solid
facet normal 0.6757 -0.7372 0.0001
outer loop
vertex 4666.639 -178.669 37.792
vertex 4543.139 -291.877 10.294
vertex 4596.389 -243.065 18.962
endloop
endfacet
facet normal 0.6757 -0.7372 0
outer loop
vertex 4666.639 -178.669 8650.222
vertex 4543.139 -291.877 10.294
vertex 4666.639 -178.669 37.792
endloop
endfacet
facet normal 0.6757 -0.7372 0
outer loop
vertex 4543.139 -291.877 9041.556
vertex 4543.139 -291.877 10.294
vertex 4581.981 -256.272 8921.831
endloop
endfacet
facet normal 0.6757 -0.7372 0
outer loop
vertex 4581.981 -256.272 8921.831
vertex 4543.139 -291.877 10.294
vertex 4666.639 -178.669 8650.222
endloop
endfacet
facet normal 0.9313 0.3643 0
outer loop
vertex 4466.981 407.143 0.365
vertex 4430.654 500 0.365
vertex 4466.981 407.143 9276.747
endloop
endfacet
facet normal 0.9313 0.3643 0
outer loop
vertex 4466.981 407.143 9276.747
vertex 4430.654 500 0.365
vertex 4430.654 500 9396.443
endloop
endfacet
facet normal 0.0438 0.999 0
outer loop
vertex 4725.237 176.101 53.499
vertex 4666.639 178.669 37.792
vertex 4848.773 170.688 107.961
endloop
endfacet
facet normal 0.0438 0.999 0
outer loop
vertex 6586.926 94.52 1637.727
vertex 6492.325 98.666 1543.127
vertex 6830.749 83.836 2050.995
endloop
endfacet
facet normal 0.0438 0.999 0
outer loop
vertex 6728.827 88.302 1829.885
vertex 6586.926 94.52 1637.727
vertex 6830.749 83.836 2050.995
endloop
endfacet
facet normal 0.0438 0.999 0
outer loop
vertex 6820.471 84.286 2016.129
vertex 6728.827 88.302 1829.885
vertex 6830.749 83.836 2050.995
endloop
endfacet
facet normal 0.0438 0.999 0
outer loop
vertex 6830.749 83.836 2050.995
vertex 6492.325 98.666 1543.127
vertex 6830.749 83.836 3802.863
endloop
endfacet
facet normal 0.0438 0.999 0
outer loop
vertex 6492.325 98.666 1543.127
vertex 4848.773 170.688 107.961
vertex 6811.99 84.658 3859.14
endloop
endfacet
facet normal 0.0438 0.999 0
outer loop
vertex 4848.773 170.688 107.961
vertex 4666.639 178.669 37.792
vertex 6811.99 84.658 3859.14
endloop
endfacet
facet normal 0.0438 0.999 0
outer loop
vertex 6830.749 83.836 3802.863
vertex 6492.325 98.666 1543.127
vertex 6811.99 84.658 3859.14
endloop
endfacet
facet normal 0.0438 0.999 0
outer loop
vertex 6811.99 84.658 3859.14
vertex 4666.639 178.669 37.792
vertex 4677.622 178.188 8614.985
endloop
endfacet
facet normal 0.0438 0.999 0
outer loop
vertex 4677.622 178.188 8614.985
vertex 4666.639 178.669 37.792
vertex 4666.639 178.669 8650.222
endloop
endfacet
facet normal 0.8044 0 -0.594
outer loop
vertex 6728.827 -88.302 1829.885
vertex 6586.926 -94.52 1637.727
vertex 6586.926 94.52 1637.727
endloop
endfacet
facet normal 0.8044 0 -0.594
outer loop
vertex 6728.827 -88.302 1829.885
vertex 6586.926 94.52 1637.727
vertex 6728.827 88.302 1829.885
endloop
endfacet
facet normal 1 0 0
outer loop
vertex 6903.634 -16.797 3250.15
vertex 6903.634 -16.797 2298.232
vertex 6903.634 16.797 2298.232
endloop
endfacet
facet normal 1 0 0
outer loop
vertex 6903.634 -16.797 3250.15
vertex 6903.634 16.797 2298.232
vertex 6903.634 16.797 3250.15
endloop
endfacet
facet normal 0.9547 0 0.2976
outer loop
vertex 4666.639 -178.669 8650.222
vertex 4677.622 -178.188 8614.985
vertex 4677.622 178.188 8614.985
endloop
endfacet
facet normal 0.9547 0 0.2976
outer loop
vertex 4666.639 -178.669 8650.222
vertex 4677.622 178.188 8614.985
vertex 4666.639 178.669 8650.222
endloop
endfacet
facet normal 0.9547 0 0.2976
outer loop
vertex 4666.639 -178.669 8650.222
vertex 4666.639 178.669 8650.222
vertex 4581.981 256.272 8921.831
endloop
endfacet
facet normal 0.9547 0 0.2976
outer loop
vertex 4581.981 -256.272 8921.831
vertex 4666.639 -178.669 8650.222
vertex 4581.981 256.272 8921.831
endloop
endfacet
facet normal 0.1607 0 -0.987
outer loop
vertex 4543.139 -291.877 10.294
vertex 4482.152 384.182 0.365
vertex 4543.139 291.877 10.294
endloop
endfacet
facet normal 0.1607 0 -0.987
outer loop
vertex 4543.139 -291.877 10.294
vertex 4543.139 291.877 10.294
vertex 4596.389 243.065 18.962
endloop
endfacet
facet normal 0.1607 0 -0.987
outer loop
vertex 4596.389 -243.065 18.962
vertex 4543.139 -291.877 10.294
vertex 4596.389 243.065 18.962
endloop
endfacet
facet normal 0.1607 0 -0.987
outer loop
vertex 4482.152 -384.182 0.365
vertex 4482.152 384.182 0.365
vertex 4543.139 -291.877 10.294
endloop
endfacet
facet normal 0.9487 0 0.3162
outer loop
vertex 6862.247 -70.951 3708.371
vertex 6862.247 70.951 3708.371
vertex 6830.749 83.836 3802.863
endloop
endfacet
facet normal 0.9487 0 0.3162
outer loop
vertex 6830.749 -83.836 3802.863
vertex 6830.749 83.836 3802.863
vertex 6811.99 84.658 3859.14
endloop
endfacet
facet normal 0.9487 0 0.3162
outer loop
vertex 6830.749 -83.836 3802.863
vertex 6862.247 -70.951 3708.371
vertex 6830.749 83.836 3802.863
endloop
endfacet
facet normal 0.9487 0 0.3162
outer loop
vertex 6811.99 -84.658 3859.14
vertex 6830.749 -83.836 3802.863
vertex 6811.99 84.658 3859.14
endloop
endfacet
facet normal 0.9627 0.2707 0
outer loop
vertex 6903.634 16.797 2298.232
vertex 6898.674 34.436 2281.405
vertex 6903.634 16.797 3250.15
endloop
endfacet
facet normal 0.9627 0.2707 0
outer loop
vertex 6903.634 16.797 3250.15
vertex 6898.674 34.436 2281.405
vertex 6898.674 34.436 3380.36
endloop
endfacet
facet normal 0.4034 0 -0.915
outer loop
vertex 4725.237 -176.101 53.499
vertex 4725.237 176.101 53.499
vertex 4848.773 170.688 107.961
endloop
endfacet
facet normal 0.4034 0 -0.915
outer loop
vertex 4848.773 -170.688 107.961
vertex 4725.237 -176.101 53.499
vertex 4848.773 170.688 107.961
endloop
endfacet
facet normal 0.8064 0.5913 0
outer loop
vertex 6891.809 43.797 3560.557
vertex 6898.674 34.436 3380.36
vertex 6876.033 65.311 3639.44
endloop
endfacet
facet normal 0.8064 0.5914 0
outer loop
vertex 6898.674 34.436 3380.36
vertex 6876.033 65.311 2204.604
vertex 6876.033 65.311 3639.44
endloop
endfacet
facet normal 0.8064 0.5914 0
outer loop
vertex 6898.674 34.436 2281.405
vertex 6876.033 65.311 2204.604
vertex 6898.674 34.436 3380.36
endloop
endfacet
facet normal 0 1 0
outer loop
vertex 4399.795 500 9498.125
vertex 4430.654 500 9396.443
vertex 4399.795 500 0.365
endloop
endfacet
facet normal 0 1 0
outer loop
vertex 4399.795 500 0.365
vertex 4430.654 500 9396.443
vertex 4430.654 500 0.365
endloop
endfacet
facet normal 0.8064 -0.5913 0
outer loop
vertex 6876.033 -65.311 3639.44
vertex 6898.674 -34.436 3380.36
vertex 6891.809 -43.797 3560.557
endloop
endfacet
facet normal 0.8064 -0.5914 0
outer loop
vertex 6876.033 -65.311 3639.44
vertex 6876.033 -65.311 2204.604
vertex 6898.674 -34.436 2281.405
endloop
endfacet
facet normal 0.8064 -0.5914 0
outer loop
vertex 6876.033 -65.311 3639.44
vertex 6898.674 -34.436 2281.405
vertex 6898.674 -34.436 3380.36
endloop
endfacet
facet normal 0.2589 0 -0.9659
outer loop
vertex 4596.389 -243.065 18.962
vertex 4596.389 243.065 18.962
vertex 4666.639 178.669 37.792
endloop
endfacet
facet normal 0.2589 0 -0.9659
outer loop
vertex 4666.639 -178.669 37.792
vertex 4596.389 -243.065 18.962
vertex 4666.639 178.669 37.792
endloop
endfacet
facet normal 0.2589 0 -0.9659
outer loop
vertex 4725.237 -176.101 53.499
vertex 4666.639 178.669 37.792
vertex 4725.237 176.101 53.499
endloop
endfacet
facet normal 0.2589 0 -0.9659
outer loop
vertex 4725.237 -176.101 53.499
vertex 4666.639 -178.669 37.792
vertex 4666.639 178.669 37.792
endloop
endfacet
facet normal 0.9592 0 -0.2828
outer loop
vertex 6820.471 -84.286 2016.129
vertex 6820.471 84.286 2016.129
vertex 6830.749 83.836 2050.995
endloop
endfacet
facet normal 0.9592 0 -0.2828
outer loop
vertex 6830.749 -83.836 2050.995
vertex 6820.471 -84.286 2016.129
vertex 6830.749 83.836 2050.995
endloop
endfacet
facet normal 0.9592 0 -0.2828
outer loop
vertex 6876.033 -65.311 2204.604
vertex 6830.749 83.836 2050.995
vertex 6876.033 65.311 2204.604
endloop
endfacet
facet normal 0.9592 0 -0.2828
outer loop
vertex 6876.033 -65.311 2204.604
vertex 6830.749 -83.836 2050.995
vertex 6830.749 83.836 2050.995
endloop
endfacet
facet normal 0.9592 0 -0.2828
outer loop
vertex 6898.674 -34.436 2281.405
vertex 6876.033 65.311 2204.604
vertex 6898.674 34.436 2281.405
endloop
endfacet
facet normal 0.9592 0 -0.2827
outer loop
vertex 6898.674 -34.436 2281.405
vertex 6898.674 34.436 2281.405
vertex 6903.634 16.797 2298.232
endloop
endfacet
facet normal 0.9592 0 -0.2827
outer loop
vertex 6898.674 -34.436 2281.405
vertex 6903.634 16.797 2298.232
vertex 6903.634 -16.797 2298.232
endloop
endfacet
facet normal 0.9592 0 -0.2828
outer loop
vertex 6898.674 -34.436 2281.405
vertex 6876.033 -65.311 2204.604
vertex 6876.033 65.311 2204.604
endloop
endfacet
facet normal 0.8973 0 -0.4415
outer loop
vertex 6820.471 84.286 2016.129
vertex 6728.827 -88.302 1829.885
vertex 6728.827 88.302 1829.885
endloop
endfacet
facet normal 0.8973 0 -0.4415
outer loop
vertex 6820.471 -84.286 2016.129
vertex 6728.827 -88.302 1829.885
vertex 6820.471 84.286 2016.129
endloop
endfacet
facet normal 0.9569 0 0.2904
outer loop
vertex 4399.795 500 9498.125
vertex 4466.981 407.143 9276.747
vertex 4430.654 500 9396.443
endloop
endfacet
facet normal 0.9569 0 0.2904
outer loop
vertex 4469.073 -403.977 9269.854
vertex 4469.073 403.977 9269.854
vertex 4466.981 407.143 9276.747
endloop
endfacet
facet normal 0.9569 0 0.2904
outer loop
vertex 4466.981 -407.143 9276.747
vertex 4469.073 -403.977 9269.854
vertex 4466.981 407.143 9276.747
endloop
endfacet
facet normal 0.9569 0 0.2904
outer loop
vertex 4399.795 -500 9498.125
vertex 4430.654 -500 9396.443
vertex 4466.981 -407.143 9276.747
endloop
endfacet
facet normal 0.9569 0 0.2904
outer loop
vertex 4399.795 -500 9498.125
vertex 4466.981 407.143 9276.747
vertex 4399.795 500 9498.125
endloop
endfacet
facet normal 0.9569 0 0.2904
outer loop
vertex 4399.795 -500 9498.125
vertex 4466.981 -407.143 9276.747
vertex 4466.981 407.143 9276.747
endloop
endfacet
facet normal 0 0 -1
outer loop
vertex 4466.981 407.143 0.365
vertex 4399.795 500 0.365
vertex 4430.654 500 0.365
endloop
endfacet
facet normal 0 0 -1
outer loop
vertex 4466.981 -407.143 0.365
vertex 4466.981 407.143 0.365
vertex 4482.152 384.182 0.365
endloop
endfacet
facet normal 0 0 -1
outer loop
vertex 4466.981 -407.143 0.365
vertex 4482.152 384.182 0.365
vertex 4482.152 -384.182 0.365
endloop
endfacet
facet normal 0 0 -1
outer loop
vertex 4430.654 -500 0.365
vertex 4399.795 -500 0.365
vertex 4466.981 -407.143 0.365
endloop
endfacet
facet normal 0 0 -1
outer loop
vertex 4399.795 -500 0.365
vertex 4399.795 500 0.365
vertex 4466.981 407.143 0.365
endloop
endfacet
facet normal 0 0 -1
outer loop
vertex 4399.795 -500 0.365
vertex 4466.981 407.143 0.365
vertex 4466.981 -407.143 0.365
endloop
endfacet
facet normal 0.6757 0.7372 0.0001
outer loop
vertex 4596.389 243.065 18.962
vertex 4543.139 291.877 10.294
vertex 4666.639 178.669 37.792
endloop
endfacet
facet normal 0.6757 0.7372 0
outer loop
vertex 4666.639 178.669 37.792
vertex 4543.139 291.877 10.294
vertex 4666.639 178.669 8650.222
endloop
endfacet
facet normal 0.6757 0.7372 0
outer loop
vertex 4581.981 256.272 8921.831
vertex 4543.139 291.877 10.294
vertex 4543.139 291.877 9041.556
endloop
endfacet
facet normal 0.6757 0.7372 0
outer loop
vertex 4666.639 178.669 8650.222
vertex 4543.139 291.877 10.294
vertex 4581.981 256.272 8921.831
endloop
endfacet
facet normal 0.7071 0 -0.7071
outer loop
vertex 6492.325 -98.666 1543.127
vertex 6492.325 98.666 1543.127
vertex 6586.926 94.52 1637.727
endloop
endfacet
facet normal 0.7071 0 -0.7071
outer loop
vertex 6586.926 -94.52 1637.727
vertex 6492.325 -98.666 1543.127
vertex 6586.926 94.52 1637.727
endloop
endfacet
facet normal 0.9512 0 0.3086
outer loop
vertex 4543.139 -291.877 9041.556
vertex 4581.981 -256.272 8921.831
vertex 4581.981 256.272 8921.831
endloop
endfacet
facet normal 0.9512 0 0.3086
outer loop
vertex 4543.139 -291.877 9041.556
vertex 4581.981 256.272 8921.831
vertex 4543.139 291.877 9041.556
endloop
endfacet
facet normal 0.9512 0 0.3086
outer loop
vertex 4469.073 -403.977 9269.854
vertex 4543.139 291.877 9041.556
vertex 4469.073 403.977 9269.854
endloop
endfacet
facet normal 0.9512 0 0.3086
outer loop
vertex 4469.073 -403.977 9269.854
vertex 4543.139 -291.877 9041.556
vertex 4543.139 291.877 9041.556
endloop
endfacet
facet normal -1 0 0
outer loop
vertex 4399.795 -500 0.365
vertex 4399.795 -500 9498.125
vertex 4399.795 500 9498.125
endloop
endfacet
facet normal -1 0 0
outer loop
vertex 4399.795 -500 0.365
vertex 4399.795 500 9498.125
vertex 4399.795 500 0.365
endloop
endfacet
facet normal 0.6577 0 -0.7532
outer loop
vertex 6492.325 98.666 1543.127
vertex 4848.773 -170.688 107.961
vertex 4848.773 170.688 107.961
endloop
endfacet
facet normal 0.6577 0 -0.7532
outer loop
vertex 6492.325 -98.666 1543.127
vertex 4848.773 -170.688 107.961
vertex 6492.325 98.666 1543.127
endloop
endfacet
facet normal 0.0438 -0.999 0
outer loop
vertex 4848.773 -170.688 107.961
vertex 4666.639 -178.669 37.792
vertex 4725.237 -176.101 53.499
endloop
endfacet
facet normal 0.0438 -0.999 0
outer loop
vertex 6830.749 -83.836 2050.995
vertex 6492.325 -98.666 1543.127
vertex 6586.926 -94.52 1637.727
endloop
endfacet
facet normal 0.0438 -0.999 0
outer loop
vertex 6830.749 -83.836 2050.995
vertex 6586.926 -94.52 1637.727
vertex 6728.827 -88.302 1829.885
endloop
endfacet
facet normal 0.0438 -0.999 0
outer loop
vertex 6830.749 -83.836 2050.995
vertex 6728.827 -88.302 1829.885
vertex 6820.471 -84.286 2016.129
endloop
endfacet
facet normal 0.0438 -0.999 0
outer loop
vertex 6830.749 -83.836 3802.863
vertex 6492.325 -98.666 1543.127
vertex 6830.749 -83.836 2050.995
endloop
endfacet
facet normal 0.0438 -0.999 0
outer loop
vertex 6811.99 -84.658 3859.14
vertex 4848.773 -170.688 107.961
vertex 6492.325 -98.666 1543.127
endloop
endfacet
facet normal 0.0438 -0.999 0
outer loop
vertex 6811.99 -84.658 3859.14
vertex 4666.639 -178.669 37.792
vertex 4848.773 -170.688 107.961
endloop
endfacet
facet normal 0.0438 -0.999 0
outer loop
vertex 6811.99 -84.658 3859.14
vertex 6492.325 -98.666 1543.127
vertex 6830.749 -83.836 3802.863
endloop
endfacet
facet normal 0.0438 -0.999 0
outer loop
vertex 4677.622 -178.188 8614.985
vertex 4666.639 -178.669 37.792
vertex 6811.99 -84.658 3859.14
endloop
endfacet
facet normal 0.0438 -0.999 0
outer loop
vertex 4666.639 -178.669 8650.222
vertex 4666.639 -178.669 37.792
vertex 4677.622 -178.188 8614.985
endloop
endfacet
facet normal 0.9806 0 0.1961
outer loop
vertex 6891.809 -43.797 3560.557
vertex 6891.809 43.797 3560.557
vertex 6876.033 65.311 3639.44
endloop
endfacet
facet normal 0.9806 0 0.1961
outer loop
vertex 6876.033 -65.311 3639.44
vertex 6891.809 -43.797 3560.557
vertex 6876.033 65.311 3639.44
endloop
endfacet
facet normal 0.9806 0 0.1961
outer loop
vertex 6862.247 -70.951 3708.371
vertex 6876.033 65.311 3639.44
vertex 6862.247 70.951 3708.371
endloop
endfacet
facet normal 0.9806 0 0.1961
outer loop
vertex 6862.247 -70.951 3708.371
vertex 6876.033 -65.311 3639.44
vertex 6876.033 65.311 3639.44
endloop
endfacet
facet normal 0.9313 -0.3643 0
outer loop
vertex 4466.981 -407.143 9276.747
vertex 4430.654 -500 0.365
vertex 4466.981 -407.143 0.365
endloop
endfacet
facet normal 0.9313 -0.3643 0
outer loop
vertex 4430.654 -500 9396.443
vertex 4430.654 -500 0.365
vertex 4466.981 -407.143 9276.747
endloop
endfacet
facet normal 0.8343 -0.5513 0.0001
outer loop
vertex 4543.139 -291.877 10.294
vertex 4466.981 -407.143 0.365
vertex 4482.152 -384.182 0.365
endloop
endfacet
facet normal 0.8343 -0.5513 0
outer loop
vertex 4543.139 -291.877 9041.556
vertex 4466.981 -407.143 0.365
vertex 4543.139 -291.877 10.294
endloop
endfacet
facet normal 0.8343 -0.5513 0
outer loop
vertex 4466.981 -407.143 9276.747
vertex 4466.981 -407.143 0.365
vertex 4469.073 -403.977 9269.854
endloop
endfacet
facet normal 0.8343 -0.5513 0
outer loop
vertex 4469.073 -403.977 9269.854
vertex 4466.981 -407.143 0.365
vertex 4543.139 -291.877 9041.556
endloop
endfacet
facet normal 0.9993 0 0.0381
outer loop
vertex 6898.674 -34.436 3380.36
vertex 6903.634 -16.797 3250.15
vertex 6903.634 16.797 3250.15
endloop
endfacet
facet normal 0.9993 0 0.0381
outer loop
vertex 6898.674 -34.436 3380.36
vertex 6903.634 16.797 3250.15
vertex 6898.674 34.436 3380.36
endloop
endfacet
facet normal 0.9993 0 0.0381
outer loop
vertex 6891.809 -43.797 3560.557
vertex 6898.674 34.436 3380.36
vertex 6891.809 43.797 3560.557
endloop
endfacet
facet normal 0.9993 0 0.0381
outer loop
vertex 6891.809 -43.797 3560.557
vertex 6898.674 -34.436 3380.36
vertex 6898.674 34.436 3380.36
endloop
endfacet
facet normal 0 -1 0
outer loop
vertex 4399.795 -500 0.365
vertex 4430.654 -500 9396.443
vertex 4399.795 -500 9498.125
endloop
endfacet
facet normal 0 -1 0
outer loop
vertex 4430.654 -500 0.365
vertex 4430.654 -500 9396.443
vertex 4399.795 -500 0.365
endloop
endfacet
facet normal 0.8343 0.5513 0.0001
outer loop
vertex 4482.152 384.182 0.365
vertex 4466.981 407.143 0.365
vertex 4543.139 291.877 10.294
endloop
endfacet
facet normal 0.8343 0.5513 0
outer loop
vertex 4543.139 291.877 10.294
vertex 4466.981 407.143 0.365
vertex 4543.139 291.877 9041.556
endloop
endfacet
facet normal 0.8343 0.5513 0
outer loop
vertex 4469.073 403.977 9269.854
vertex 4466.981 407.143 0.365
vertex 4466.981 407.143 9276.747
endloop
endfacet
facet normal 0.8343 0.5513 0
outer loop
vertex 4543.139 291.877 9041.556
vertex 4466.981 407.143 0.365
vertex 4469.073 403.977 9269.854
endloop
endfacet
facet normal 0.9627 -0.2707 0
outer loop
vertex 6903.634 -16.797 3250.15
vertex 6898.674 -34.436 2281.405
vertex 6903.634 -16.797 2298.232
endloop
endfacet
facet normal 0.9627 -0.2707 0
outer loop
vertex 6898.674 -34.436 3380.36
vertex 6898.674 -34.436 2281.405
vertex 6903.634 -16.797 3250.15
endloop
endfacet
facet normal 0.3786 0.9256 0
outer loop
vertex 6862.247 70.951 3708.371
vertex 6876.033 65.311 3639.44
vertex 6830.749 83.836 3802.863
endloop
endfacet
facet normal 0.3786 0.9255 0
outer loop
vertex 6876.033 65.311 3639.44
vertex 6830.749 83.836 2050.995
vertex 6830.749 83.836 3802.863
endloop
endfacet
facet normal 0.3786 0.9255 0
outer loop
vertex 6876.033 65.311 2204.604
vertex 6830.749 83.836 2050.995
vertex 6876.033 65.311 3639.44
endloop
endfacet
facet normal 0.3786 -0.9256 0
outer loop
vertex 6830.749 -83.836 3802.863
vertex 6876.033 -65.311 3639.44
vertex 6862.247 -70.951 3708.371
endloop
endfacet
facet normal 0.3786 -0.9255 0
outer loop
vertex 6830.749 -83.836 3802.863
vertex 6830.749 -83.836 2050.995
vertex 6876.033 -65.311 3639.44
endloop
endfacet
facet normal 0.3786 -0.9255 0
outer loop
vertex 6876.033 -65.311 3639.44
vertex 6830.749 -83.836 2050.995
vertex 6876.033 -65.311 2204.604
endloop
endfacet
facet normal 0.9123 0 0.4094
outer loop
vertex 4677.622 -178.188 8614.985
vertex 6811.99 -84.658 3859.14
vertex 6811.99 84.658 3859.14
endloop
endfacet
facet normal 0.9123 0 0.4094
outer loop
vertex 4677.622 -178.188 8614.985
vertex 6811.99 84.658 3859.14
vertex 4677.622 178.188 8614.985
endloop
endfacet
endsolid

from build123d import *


with BuildPart() as sweep001:
    # Sweep001: sweep along a path in Sketch012
    with BuildLine(Plane.XZ) as sweep001_path:
        Line((5218.905273, -181.283066), (5218.905273, 9949.081055))
    # Sketch011 → Sweep001 (sweep)
    with BuildSketch(Plane.XY):
        Polygon((4426.060059, 511.743744), (4466.980957, 407.14325), (4543.13916, 291.877106), (4666.638672, 178.669174), (6830.749023, 83.835869), (6876.032715, 65.310944), (6898.673828, 34.436073), (6906.771484, 5.640844), (6936.856445, 5.640844), (6936.856445, 613.723572), (4426.060059, 613.723572), align=None)
    sweep(path=sweep001_path.line)


with BuildPart() as fusion:
    # Part__Mirroring: instance of Sweep001
    add(sweep001.part.mirror(Plane(origin=(0, 0, 0), x_dir=(1, 0, 0), z_dir=(0, 1, 0))))

    # Fusion: union Sweep001
    add(sweep001.part)


with BuildPart() as rear_fin_solid:
    # Sweep: sweep along a path in Sketch009
    with BuildLine(Plane.XY.offset(1000)) as sweep_path:
        Line((5367.873535, 500), (5367.873535, -500))
    # Sketch010 → Sweep (sweep)
    with BuildSketch(Plane.XZ):
        Polygon((4399.794922, 9498.125), (4469.072754, 9269.854492), (4581.981445, 8921.831055), (4677.621582, 8614.985352), (6811.989746, 3859.140381), (6862.246582, 3708.371094), (6891.809082, 3560.557373), (6903.634277, 3250.149658), (6903.634277, 2298.231934), (6820.470703, 2016.129272), (6728.82666, 1829.884521), (6586.925781, 1637.727295), (6492.325195, 1543.126709), (4848.772949, 107.96067), (4725.237305, 53.498909), (4596.38916, 18.962172), (4482.151855, 0.365468), (4399.794922, 0.365468), align=None)
    sweep(path=sweep_path.line)

    # Cut: cut Fusion
    add(fusion.part, mode=Mode.SUBTRACT)


solid = rear_fin_solid.part
